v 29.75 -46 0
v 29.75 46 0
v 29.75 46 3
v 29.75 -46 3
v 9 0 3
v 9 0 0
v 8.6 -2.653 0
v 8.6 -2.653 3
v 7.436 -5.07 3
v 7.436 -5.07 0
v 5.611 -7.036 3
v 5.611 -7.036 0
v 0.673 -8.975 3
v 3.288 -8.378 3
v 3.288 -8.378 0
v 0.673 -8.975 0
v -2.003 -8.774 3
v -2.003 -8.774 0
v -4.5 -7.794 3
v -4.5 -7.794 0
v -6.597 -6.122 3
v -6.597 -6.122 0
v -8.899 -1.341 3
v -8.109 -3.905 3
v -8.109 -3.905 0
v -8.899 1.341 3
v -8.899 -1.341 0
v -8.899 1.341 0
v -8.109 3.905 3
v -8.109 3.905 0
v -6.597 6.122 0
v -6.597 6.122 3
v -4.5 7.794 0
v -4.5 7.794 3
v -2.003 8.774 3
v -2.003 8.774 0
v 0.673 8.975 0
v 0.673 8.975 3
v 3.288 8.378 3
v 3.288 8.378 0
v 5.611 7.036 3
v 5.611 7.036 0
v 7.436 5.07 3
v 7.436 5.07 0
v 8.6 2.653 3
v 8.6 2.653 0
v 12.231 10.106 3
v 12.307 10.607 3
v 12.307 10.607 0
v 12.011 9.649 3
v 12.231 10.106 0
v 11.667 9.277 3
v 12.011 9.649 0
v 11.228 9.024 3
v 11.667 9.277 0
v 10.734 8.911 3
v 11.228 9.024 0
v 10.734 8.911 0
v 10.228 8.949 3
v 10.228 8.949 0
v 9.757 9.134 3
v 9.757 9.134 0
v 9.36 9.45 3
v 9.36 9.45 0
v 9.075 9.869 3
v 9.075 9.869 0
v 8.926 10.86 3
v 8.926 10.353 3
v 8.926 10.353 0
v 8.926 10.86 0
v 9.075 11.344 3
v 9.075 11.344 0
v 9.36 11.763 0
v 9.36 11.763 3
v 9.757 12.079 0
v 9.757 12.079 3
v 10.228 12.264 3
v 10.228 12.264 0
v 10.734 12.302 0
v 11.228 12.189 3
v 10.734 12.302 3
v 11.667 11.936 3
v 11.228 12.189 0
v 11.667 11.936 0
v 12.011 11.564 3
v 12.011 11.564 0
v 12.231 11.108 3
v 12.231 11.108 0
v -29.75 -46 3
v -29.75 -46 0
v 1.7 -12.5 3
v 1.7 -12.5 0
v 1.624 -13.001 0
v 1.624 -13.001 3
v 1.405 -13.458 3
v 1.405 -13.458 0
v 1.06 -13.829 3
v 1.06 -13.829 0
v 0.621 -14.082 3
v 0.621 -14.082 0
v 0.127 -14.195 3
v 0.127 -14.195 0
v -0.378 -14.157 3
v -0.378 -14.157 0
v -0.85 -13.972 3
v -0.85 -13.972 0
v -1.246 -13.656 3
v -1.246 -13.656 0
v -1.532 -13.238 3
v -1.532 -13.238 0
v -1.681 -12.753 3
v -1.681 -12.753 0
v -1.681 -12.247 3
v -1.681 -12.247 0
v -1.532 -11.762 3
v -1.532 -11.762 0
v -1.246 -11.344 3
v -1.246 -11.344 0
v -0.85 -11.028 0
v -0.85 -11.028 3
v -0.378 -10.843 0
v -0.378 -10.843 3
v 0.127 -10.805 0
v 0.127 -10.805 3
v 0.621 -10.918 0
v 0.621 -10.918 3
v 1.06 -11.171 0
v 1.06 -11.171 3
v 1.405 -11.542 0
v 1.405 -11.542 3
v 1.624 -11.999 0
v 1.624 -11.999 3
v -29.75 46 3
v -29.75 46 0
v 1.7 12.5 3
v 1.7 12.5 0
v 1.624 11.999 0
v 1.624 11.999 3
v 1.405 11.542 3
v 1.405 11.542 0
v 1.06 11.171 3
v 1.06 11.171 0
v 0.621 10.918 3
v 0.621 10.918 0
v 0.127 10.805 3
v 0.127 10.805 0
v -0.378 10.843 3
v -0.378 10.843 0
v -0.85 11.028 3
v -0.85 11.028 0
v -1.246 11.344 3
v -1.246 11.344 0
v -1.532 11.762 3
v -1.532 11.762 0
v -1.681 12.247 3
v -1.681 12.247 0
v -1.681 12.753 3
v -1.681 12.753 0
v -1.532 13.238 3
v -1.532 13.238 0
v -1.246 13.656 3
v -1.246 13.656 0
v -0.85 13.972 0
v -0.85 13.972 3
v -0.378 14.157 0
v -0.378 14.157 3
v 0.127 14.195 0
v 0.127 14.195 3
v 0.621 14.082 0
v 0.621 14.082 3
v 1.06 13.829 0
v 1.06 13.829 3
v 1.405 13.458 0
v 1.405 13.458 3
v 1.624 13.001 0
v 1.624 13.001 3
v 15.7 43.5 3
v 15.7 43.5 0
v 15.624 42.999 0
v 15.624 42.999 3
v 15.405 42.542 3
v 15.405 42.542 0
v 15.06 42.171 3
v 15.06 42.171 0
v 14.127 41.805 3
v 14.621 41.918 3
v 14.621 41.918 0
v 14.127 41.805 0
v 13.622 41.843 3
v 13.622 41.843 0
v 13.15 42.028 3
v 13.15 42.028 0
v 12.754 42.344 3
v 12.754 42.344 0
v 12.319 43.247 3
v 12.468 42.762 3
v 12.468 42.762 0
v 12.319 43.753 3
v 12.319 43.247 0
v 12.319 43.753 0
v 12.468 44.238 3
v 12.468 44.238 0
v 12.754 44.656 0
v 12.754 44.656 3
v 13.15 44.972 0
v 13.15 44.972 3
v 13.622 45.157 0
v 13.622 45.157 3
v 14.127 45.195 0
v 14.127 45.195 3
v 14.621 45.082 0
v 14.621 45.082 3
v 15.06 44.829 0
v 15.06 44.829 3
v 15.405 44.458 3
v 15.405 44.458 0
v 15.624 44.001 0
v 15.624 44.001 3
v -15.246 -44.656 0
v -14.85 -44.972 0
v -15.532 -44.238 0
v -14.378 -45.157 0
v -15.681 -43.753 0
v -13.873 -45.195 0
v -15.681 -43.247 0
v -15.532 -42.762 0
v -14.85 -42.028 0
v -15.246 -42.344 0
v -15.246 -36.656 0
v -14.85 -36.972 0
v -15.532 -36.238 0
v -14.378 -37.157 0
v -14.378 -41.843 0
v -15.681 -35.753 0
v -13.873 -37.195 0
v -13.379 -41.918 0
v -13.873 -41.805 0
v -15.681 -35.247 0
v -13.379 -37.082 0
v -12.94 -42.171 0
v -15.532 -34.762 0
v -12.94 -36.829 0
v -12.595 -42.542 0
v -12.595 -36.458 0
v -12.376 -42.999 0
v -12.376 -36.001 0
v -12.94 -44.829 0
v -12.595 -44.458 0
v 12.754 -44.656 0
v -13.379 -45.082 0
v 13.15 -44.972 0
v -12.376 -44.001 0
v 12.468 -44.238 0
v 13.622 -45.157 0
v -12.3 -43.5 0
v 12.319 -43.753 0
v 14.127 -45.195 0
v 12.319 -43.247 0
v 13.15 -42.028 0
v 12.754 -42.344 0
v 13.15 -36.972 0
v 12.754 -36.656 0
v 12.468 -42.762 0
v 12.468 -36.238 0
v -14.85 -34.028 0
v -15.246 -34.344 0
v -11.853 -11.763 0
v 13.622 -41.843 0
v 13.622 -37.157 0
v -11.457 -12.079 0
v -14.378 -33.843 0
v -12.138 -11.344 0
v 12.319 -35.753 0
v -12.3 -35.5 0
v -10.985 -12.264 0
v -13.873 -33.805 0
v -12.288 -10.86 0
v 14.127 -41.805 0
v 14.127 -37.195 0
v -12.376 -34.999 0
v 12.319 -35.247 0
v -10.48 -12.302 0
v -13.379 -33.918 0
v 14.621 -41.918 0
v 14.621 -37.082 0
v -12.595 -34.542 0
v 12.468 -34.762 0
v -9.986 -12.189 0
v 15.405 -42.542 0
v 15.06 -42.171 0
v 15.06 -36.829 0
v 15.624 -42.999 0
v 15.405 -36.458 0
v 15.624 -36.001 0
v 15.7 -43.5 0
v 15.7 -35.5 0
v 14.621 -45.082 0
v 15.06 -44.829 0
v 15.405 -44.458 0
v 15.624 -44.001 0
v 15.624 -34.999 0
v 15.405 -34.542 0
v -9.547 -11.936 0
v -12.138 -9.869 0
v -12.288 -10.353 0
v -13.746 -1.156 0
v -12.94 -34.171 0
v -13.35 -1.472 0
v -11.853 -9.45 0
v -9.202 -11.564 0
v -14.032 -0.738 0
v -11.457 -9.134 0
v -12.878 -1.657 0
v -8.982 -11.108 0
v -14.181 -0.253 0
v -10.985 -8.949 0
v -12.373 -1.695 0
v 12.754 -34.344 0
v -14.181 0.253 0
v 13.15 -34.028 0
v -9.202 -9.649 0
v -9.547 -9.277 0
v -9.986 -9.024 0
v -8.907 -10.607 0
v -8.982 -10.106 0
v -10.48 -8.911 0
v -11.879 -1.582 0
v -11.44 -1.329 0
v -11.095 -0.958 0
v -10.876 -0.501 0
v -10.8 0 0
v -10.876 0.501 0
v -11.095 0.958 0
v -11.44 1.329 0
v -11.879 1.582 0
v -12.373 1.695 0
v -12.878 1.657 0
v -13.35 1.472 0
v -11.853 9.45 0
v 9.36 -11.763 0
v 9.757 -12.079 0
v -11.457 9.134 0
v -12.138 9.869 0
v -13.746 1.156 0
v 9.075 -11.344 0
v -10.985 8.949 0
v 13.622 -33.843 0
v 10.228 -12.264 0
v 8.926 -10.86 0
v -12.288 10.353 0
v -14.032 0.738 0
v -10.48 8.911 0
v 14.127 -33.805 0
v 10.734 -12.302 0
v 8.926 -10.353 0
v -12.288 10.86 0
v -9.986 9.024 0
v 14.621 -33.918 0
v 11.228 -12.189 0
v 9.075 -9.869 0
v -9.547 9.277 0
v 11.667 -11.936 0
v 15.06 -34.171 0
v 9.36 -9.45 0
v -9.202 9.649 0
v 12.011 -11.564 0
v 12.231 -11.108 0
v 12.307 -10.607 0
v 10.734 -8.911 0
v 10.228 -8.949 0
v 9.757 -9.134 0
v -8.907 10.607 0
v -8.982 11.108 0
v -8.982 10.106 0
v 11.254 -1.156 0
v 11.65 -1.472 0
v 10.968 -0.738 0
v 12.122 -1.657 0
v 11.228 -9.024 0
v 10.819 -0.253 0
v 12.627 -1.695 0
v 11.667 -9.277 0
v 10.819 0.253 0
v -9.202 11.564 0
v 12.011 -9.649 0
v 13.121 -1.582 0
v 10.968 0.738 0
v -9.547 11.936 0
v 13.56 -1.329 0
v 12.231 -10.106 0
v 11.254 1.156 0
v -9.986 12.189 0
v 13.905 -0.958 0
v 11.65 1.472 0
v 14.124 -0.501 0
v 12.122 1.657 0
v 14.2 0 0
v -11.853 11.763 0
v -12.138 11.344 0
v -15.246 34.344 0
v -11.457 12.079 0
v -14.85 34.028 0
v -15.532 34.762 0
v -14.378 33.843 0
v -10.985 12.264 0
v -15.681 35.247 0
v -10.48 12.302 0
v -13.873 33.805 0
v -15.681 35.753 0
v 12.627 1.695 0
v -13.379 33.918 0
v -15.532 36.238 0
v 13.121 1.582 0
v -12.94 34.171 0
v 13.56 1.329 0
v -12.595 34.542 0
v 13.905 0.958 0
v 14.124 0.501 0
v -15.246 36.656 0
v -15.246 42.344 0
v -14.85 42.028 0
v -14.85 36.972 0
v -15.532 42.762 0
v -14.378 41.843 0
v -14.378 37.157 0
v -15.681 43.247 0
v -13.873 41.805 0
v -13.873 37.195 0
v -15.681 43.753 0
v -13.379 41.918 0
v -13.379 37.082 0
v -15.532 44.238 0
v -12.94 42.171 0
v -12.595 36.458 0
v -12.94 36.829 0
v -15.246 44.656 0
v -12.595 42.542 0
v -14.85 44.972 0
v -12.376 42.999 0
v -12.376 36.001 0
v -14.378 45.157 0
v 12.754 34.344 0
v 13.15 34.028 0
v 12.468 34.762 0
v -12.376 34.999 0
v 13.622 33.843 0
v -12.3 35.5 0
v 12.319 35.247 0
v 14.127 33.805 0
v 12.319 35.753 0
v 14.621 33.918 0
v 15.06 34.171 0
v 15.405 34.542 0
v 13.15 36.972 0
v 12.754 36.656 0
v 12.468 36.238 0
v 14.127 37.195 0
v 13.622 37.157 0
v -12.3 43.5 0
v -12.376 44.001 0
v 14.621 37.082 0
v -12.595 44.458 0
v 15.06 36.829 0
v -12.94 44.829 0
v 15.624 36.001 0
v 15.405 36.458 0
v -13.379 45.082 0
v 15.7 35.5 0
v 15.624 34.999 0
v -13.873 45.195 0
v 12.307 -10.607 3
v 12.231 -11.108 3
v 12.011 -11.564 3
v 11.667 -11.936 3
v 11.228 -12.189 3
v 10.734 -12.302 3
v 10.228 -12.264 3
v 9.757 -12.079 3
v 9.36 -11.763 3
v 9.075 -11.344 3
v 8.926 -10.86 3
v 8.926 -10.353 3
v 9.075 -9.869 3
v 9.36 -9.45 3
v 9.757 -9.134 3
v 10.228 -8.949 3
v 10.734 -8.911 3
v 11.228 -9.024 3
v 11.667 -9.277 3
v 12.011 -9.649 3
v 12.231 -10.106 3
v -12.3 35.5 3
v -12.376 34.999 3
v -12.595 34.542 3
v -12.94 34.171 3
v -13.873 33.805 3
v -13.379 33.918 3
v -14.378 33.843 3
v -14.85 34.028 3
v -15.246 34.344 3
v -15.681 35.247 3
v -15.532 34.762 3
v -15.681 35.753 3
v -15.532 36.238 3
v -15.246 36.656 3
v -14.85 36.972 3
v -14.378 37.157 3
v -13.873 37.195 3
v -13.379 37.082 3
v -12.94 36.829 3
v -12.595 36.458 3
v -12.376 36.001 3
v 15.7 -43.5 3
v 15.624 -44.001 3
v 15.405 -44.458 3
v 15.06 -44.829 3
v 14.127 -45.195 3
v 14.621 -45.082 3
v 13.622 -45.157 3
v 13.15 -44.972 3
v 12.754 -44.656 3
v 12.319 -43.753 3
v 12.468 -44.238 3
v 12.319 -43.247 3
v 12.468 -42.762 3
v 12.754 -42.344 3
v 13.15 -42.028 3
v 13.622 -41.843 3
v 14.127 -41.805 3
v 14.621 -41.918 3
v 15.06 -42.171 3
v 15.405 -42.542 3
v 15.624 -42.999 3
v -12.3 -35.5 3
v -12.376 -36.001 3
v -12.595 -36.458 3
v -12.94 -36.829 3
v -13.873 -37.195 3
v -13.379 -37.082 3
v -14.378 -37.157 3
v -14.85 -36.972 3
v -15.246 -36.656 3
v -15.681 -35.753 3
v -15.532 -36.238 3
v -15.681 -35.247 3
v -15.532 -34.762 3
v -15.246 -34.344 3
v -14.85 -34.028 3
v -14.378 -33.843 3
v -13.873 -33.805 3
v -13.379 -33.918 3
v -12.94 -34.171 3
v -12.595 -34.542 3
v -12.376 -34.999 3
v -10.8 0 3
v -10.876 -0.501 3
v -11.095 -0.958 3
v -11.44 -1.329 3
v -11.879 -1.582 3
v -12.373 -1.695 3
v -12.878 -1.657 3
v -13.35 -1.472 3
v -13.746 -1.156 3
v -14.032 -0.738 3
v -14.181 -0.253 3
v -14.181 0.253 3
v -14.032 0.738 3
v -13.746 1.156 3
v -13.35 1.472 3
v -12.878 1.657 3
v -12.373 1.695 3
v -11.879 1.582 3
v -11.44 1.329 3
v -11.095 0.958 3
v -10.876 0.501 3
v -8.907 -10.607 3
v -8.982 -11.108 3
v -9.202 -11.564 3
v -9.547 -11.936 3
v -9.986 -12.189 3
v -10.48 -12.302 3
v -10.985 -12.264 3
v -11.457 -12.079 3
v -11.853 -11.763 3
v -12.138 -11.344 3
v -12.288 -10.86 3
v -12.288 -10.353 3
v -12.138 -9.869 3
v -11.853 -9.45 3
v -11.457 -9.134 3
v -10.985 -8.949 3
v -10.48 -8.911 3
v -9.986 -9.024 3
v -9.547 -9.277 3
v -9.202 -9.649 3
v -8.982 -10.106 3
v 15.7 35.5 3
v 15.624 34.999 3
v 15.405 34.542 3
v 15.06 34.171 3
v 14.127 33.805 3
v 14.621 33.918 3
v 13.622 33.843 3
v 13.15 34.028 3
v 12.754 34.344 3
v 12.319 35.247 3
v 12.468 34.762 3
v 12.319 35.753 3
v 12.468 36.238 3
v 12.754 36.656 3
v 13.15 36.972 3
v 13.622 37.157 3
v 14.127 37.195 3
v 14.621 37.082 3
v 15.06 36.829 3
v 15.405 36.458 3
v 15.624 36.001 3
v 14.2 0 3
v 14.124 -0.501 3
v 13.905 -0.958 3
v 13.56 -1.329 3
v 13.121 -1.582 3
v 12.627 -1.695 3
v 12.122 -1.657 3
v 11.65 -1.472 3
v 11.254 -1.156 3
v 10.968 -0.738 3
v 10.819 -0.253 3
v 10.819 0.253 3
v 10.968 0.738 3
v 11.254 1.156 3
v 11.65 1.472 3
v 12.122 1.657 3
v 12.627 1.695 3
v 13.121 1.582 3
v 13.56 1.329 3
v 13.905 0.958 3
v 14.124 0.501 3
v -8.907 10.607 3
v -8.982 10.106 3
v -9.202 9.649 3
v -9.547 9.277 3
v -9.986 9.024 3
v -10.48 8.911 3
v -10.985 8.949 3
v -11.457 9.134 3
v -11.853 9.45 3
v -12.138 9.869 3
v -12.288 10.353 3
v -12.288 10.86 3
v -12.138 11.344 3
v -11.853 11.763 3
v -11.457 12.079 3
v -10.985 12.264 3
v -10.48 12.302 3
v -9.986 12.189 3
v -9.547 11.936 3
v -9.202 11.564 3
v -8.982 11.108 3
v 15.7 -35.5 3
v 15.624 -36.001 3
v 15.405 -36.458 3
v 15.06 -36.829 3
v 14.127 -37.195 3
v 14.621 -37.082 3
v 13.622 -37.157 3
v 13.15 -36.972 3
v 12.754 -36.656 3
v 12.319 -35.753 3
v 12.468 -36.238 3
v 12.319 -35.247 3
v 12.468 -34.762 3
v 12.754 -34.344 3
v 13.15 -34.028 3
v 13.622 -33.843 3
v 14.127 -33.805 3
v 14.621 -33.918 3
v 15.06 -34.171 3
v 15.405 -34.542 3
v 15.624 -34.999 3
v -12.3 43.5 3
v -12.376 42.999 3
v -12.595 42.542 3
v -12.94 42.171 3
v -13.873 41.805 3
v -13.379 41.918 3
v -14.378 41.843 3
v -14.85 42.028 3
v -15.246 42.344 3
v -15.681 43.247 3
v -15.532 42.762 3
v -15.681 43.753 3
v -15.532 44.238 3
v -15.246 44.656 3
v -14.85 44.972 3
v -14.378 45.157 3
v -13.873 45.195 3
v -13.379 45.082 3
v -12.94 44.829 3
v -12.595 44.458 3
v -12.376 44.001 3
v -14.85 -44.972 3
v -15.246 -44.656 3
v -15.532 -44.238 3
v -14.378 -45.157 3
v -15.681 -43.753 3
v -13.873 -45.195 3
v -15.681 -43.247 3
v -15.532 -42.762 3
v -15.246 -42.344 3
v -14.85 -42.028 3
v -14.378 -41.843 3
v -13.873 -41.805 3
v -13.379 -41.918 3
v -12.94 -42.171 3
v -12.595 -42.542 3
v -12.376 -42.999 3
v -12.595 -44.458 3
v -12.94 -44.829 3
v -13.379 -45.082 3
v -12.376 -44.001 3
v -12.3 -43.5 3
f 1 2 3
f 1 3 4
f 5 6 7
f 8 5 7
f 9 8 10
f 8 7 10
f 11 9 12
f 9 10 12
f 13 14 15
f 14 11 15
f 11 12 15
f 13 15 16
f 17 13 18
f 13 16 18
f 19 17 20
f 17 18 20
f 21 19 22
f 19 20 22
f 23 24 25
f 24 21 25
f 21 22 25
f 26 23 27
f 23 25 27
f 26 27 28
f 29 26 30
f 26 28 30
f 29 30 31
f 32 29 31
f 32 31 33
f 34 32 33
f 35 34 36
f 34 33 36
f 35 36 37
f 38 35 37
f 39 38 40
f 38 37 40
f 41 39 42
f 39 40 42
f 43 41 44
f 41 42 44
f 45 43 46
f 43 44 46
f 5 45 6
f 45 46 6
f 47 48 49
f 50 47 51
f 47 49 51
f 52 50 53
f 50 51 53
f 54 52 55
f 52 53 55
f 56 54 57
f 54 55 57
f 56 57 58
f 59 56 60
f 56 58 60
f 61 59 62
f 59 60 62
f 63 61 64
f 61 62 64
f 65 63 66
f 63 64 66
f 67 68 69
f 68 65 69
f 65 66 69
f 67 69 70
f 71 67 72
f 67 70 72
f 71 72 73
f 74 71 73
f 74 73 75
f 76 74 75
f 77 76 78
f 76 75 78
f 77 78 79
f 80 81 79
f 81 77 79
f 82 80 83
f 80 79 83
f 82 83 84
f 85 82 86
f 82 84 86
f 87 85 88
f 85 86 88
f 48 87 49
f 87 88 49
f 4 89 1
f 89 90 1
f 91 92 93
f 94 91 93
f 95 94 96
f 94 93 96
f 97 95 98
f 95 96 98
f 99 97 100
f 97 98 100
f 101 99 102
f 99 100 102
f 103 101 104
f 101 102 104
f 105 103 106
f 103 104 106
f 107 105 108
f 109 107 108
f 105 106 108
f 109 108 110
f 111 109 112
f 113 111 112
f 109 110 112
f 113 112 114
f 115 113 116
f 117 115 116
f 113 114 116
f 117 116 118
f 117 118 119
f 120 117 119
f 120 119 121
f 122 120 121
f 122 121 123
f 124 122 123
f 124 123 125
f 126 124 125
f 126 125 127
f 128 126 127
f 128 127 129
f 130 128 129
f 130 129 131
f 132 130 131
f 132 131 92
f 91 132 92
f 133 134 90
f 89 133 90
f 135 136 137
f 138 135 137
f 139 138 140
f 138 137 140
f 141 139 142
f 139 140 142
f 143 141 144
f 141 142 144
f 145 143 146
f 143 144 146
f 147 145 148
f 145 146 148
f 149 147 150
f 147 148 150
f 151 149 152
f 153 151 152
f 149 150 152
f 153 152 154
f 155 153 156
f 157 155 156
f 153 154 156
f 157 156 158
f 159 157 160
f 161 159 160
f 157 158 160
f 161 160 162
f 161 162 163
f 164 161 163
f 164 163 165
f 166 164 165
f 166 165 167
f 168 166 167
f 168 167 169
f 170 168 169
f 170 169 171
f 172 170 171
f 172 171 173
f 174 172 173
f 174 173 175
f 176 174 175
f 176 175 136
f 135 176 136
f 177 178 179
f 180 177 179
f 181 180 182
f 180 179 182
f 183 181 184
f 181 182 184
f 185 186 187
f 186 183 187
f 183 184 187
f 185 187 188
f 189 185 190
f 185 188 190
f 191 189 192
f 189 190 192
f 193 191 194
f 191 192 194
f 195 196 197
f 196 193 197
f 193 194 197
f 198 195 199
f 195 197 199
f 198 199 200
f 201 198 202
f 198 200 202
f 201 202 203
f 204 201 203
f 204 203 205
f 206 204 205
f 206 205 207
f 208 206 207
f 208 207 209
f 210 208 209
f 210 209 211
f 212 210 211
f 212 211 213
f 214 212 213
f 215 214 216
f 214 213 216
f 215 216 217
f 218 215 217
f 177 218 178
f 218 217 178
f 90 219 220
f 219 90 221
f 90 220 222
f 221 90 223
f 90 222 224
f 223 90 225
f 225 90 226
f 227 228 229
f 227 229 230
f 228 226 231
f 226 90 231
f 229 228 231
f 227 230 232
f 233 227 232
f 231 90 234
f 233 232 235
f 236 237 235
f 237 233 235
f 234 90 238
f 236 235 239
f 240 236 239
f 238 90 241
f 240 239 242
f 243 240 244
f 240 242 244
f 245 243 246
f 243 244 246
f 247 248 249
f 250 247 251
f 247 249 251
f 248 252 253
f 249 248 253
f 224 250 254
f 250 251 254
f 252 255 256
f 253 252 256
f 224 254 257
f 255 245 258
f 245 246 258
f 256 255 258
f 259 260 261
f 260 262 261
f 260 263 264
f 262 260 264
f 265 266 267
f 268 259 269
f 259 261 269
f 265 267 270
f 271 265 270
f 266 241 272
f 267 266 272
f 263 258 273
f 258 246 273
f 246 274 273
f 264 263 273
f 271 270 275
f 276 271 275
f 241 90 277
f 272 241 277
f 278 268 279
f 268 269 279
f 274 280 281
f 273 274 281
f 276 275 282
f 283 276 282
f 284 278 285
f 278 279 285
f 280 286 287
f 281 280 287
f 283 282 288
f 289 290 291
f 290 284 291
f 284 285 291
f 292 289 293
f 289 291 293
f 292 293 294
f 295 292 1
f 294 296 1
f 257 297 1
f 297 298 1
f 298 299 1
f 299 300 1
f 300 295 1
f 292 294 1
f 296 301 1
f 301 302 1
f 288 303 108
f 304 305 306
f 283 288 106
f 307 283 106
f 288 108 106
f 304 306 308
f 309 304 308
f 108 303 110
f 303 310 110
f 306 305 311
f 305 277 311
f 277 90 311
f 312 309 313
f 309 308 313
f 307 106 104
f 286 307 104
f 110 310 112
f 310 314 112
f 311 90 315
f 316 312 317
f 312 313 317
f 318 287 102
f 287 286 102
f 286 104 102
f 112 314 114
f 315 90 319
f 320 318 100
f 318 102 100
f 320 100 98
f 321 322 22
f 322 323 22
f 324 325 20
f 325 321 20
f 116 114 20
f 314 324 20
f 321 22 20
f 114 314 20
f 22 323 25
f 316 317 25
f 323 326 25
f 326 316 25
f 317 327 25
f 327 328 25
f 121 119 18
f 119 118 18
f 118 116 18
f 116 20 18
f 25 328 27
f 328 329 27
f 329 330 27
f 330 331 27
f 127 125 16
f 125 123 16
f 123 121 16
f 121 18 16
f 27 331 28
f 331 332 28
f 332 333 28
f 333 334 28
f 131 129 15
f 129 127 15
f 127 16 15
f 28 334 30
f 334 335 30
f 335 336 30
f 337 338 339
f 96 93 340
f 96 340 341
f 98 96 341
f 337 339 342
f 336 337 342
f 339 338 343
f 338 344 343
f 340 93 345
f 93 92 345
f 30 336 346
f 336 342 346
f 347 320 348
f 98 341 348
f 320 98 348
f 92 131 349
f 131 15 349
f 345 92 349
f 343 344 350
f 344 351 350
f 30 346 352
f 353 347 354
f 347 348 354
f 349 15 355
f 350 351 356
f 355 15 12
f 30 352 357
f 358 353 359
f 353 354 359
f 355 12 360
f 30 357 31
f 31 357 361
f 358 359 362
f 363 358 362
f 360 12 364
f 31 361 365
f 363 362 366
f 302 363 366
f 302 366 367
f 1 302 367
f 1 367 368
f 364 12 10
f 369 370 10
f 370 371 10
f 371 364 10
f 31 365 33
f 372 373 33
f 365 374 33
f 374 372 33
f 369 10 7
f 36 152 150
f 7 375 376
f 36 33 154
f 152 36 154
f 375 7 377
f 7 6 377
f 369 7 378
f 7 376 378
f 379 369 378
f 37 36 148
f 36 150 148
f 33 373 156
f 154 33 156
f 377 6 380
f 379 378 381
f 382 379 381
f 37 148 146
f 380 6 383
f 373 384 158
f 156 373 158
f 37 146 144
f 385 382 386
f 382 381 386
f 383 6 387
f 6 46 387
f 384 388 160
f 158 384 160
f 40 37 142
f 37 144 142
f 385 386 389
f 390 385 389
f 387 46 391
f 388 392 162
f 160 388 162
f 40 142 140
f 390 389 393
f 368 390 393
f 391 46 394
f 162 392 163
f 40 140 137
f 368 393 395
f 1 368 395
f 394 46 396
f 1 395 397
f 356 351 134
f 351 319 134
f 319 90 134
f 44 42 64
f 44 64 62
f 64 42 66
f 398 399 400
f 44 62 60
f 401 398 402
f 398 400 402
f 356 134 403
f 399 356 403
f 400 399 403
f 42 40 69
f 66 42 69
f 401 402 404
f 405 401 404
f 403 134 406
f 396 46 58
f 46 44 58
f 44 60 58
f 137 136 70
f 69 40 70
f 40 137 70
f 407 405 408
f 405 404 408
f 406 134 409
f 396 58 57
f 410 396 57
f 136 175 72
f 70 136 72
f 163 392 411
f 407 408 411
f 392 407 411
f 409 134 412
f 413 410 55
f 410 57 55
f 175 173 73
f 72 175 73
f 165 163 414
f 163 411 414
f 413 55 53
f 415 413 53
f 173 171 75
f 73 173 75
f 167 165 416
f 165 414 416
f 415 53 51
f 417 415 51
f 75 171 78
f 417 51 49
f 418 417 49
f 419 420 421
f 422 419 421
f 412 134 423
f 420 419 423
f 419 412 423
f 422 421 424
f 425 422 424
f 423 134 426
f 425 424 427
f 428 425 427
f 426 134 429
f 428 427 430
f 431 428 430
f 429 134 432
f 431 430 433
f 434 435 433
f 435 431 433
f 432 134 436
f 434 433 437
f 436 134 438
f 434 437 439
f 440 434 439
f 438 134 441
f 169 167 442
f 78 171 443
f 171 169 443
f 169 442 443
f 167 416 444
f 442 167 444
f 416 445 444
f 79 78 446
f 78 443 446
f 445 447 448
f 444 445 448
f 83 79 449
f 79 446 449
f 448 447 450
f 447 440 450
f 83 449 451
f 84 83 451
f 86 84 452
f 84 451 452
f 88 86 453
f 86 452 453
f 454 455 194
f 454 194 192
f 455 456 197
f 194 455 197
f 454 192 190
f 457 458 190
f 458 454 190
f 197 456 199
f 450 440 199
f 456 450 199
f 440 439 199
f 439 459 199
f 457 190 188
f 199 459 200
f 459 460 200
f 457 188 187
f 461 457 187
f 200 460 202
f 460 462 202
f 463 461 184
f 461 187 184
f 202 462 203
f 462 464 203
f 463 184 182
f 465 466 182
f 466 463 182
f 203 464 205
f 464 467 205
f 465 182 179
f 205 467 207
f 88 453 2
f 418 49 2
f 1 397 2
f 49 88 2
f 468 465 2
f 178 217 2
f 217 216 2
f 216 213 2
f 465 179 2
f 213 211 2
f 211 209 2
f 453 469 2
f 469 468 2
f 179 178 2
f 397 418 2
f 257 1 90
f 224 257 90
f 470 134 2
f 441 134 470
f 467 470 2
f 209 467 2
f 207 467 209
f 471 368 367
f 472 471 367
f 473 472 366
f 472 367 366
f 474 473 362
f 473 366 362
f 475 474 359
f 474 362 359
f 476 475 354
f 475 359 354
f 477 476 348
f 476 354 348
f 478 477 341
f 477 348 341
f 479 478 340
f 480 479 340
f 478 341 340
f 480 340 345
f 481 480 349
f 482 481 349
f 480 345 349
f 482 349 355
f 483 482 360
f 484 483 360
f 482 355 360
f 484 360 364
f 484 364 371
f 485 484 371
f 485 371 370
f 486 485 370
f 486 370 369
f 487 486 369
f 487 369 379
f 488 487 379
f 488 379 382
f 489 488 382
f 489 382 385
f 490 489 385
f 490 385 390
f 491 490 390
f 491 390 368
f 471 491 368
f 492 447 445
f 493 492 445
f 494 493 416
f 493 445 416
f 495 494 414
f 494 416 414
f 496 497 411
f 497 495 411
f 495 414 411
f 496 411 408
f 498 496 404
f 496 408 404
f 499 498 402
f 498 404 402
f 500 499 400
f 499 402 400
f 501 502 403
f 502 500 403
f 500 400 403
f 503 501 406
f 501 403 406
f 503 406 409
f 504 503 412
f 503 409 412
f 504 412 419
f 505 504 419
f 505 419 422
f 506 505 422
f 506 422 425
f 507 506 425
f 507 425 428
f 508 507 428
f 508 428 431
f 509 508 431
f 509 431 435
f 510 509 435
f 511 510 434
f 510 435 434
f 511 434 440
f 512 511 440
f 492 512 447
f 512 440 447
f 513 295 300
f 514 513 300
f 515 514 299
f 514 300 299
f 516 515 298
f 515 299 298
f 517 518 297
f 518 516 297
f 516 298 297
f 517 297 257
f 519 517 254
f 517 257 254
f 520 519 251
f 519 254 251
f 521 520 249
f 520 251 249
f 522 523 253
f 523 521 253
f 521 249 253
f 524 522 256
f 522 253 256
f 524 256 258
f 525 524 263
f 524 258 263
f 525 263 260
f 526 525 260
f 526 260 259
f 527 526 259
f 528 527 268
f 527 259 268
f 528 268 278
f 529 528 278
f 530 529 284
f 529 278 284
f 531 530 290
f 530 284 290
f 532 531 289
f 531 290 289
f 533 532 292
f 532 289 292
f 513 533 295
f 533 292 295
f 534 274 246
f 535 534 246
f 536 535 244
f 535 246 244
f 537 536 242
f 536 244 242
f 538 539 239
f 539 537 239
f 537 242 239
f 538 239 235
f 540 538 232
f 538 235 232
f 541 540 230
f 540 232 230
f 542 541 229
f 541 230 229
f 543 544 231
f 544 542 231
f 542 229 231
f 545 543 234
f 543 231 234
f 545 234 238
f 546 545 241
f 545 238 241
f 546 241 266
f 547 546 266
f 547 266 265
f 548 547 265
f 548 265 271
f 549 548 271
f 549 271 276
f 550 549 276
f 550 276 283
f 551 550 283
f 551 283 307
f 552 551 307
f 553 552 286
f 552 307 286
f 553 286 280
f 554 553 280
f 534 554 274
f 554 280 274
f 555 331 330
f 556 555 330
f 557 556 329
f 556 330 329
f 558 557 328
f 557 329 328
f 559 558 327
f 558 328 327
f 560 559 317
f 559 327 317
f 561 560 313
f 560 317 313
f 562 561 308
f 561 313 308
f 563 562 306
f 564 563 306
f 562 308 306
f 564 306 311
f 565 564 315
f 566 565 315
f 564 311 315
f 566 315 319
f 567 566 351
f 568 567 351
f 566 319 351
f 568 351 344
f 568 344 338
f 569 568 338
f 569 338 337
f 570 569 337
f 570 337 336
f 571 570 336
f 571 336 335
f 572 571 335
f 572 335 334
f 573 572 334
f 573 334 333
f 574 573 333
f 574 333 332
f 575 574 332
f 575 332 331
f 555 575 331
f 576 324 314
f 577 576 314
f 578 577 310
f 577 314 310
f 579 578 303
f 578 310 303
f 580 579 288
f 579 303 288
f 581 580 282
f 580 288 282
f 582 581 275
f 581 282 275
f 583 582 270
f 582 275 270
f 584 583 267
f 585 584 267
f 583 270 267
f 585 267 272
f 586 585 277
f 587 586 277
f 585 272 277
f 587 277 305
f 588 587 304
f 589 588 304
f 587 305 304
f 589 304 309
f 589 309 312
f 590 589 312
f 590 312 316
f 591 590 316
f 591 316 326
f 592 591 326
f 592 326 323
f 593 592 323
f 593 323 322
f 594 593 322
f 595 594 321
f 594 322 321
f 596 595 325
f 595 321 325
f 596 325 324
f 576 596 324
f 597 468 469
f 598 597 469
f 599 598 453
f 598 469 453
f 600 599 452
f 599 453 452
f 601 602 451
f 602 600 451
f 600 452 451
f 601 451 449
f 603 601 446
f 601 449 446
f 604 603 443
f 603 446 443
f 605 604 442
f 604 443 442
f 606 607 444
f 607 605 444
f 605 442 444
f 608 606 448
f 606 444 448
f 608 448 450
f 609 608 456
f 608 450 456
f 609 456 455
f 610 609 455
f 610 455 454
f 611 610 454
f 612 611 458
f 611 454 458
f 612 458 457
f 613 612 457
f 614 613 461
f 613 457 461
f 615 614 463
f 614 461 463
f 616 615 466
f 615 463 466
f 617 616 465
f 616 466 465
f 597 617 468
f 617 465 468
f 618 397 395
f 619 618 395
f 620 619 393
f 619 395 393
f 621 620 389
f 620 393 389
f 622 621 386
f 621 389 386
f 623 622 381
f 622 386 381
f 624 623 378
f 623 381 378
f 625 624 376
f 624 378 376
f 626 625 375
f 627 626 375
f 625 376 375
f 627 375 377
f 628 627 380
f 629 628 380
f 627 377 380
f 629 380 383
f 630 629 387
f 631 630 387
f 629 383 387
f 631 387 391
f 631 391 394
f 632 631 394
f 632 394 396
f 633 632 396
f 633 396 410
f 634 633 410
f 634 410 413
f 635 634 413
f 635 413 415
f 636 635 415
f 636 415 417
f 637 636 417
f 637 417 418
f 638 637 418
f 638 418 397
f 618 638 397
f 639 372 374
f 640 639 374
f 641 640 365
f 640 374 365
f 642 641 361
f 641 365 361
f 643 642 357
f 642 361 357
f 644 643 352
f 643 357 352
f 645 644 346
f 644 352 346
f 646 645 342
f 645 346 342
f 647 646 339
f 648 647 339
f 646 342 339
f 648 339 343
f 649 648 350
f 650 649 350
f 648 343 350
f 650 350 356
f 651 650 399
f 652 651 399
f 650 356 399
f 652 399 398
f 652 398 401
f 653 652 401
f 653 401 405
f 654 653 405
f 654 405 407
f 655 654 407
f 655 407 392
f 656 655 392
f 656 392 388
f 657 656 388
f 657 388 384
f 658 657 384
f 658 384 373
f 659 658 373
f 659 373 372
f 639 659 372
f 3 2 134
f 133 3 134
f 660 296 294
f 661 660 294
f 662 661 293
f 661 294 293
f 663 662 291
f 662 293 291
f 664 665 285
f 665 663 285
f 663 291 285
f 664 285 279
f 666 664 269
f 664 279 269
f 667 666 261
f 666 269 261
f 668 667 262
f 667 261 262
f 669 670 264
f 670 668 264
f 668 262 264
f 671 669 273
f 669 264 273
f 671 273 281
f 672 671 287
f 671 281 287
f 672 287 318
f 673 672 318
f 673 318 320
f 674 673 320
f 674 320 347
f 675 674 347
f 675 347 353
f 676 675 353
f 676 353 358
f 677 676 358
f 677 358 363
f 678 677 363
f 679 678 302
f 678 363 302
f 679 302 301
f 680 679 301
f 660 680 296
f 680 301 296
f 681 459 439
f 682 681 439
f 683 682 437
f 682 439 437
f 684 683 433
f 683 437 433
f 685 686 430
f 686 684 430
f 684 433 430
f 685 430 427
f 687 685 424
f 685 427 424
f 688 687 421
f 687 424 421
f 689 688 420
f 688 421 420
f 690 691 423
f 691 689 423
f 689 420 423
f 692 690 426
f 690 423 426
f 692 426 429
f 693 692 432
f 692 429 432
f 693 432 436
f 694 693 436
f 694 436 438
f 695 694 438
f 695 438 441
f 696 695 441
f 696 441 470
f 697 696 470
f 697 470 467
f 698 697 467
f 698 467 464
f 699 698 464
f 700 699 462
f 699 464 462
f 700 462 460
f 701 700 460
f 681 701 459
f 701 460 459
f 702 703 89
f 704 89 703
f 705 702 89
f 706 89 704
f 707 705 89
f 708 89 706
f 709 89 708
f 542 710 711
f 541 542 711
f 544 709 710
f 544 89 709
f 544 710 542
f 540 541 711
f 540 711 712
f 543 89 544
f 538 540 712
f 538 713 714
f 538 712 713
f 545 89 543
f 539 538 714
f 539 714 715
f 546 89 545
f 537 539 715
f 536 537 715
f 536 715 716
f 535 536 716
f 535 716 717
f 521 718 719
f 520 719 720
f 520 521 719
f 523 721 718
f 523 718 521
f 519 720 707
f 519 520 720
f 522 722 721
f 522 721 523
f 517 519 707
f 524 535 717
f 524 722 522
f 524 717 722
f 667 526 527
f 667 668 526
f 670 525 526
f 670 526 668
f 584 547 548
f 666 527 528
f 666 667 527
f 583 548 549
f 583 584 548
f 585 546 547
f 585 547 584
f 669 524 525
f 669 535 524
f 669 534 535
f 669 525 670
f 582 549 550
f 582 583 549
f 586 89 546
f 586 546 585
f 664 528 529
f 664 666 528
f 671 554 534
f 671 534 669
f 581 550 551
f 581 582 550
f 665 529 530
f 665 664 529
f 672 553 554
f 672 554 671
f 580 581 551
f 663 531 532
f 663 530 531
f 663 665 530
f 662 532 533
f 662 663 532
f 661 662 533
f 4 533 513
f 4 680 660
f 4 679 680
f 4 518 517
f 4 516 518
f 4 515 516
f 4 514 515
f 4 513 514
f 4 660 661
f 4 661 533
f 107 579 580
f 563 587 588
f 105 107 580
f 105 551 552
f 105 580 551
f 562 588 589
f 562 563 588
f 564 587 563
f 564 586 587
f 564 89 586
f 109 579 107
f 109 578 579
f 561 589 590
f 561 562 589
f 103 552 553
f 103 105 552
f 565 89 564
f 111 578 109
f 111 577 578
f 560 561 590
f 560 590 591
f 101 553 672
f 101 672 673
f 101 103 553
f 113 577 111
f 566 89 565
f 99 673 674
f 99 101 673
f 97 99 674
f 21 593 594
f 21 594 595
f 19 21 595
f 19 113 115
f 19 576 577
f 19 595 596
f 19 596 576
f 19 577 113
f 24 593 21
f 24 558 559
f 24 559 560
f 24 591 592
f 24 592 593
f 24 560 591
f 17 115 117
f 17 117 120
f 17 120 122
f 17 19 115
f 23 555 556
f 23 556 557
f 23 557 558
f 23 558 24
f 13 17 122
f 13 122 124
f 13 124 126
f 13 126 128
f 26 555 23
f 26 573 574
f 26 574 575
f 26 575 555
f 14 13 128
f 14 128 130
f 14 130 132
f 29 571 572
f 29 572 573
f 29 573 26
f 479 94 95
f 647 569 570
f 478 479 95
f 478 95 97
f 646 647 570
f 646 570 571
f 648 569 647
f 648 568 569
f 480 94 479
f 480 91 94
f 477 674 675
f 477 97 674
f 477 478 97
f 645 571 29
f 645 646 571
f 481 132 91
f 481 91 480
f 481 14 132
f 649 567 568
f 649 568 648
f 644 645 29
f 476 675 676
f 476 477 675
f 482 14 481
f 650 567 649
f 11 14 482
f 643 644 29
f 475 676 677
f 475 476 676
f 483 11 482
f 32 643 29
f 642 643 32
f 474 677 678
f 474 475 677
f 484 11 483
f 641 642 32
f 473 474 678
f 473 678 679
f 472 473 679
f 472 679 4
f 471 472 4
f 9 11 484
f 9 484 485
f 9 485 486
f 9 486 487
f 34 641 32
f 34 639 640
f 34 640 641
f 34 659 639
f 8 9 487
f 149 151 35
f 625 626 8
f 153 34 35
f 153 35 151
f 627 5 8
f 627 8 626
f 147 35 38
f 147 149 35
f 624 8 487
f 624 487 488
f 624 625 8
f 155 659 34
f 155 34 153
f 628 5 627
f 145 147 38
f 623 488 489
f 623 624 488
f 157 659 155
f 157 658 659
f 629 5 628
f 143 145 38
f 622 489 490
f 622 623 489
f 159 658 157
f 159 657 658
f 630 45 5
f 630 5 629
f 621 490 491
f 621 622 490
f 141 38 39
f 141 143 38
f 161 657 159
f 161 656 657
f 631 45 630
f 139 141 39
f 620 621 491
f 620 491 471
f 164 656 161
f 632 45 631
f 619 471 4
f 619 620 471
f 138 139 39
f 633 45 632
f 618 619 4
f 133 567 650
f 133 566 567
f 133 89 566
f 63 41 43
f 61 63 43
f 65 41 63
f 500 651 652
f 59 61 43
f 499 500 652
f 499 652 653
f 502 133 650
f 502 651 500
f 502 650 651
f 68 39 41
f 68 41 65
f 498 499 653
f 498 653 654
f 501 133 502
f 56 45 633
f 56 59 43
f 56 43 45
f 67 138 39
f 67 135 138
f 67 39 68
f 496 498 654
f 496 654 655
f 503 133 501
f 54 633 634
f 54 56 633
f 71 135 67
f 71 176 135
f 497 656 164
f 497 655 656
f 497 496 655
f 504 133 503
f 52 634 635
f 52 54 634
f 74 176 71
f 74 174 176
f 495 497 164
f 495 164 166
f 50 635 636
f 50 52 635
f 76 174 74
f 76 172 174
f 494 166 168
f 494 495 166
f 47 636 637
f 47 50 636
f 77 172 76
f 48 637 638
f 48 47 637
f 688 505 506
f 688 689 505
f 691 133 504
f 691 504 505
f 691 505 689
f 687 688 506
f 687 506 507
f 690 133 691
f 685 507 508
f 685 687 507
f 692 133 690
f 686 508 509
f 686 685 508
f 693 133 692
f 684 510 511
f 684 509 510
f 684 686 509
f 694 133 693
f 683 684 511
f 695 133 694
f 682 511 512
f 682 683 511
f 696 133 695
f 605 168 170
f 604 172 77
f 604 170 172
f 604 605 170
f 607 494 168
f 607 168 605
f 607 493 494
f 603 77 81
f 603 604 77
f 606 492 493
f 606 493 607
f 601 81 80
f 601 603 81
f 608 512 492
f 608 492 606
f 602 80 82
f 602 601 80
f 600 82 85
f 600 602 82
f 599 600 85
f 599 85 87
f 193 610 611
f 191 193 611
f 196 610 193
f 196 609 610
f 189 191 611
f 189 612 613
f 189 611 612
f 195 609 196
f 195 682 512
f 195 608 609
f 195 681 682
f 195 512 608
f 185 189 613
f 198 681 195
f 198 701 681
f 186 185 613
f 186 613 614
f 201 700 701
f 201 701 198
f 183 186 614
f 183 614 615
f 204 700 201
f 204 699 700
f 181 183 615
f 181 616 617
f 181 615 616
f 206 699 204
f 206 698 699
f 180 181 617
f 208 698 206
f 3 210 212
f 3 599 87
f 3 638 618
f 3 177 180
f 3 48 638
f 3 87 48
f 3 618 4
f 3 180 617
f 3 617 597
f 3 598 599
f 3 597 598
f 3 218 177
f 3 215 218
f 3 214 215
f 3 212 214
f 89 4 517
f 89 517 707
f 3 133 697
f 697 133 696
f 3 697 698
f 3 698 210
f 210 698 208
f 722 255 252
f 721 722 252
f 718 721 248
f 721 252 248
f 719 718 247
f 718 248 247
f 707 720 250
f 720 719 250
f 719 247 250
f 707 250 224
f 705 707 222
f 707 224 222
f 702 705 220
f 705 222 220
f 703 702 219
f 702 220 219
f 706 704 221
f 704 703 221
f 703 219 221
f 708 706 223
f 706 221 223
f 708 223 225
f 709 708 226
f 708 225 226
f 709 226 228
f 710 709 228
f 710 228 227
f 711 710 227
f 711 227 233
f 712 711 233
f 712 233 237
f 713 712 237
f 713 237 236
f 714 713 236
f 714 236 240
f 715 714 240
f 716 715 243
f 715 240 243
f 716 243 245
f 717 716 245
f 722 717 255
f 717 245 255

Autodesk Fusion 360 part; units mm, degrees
sketch "Sketch1" plane through (0, 0, 0) normal (0, 0, 1) x (1, 0, 0)
  circle A0 centre (0, 0) radius 29.75
  circle A1 centre (0, 0) radius 12.5
  circle A2 centre (0, 0) radius 15
  circle A3 centre (0, 12.5) radius 1.7
  circle A4 centre (-10.6066, 10.6066) radius 1.7
  circle A5 centre (-10.6066, -10.6066) radius 1.7
  circle A6 centre (-12.5, 0) radius 1.7
  circle A7 centre (10.6066, -10.6066) radius 1.7
  circle A8 centre (0, -12.5) radius 1.7
  circle A9 centre (10.6066, 10.6066) radius 1.7
  circle A10 centre (12.5, 0) radius 1.7
  circle A11 centre (-14, 35.5) radius 1.7
  circle A12 centre (14, 35.5) radius 1.7
  circle A13 centre (14, -35.5) radius 1.7
  circle A14 centre (-14, -35.5) radius 1.7
  line L0 (29.75, 38) -> (29.75, -38)
  line L1 (-29.75, -38) -> (-29.75, 38)
  circle A15 centre (0, 0) radius 9
  line L2 (29.75, 38) -> (29.75, 46)
  line L3 (29.75, 46) -> (-29.75, 46)
  line L4 (-29.75, 46) -> (-29.75, 38)
  circle A16 centre (-14, 43.5) radius 1.7
  circle A17 centre (14, 43.5) radius 1.7
  line L5 (-29.75, -46) -> (29.75, -46)
  line L6 (29.75, -46) -> (29.75, -38)
  line L7 (-29.75, -38) -> (-29.75, -46)
  circle A18 centre (-14, -43.5) radius 1.7
  circle A19 centre (14, -43.5) radius 1.7
  dimension "d1" = 59.5
  dimension "d2" = 25
  dimension "d3" = 30
  dimension "d5" = 3.4
  dimension "d10" = 360
  dimension "d13" = 3.4
  dimension "d14" = 3.4
  dimension "d15" = 3.4
  dimension "d16" = 3.4
  dimension "d17" = 59.5
  dimension "d18" = 76
  dimension "d19" = 18
  dimension "d23" = 8
  dimension "d24" = 3.4
  dimension "d25" = 3.4
  dimension "d27" = 59.5
  dimension "d28" = 8
  dimension "d29" = 3.4
  dimension "d30" = 3.4
extrude "Extrude2" add sketch "Sketch1" along normal blind 3 contours A0 | A0 L0 L1 L5 L6 L7 | A0 L0 L1 L2 L3 L4 | A1 A3 A6 A8 A10 | A2 A4 A5 A7 A9
